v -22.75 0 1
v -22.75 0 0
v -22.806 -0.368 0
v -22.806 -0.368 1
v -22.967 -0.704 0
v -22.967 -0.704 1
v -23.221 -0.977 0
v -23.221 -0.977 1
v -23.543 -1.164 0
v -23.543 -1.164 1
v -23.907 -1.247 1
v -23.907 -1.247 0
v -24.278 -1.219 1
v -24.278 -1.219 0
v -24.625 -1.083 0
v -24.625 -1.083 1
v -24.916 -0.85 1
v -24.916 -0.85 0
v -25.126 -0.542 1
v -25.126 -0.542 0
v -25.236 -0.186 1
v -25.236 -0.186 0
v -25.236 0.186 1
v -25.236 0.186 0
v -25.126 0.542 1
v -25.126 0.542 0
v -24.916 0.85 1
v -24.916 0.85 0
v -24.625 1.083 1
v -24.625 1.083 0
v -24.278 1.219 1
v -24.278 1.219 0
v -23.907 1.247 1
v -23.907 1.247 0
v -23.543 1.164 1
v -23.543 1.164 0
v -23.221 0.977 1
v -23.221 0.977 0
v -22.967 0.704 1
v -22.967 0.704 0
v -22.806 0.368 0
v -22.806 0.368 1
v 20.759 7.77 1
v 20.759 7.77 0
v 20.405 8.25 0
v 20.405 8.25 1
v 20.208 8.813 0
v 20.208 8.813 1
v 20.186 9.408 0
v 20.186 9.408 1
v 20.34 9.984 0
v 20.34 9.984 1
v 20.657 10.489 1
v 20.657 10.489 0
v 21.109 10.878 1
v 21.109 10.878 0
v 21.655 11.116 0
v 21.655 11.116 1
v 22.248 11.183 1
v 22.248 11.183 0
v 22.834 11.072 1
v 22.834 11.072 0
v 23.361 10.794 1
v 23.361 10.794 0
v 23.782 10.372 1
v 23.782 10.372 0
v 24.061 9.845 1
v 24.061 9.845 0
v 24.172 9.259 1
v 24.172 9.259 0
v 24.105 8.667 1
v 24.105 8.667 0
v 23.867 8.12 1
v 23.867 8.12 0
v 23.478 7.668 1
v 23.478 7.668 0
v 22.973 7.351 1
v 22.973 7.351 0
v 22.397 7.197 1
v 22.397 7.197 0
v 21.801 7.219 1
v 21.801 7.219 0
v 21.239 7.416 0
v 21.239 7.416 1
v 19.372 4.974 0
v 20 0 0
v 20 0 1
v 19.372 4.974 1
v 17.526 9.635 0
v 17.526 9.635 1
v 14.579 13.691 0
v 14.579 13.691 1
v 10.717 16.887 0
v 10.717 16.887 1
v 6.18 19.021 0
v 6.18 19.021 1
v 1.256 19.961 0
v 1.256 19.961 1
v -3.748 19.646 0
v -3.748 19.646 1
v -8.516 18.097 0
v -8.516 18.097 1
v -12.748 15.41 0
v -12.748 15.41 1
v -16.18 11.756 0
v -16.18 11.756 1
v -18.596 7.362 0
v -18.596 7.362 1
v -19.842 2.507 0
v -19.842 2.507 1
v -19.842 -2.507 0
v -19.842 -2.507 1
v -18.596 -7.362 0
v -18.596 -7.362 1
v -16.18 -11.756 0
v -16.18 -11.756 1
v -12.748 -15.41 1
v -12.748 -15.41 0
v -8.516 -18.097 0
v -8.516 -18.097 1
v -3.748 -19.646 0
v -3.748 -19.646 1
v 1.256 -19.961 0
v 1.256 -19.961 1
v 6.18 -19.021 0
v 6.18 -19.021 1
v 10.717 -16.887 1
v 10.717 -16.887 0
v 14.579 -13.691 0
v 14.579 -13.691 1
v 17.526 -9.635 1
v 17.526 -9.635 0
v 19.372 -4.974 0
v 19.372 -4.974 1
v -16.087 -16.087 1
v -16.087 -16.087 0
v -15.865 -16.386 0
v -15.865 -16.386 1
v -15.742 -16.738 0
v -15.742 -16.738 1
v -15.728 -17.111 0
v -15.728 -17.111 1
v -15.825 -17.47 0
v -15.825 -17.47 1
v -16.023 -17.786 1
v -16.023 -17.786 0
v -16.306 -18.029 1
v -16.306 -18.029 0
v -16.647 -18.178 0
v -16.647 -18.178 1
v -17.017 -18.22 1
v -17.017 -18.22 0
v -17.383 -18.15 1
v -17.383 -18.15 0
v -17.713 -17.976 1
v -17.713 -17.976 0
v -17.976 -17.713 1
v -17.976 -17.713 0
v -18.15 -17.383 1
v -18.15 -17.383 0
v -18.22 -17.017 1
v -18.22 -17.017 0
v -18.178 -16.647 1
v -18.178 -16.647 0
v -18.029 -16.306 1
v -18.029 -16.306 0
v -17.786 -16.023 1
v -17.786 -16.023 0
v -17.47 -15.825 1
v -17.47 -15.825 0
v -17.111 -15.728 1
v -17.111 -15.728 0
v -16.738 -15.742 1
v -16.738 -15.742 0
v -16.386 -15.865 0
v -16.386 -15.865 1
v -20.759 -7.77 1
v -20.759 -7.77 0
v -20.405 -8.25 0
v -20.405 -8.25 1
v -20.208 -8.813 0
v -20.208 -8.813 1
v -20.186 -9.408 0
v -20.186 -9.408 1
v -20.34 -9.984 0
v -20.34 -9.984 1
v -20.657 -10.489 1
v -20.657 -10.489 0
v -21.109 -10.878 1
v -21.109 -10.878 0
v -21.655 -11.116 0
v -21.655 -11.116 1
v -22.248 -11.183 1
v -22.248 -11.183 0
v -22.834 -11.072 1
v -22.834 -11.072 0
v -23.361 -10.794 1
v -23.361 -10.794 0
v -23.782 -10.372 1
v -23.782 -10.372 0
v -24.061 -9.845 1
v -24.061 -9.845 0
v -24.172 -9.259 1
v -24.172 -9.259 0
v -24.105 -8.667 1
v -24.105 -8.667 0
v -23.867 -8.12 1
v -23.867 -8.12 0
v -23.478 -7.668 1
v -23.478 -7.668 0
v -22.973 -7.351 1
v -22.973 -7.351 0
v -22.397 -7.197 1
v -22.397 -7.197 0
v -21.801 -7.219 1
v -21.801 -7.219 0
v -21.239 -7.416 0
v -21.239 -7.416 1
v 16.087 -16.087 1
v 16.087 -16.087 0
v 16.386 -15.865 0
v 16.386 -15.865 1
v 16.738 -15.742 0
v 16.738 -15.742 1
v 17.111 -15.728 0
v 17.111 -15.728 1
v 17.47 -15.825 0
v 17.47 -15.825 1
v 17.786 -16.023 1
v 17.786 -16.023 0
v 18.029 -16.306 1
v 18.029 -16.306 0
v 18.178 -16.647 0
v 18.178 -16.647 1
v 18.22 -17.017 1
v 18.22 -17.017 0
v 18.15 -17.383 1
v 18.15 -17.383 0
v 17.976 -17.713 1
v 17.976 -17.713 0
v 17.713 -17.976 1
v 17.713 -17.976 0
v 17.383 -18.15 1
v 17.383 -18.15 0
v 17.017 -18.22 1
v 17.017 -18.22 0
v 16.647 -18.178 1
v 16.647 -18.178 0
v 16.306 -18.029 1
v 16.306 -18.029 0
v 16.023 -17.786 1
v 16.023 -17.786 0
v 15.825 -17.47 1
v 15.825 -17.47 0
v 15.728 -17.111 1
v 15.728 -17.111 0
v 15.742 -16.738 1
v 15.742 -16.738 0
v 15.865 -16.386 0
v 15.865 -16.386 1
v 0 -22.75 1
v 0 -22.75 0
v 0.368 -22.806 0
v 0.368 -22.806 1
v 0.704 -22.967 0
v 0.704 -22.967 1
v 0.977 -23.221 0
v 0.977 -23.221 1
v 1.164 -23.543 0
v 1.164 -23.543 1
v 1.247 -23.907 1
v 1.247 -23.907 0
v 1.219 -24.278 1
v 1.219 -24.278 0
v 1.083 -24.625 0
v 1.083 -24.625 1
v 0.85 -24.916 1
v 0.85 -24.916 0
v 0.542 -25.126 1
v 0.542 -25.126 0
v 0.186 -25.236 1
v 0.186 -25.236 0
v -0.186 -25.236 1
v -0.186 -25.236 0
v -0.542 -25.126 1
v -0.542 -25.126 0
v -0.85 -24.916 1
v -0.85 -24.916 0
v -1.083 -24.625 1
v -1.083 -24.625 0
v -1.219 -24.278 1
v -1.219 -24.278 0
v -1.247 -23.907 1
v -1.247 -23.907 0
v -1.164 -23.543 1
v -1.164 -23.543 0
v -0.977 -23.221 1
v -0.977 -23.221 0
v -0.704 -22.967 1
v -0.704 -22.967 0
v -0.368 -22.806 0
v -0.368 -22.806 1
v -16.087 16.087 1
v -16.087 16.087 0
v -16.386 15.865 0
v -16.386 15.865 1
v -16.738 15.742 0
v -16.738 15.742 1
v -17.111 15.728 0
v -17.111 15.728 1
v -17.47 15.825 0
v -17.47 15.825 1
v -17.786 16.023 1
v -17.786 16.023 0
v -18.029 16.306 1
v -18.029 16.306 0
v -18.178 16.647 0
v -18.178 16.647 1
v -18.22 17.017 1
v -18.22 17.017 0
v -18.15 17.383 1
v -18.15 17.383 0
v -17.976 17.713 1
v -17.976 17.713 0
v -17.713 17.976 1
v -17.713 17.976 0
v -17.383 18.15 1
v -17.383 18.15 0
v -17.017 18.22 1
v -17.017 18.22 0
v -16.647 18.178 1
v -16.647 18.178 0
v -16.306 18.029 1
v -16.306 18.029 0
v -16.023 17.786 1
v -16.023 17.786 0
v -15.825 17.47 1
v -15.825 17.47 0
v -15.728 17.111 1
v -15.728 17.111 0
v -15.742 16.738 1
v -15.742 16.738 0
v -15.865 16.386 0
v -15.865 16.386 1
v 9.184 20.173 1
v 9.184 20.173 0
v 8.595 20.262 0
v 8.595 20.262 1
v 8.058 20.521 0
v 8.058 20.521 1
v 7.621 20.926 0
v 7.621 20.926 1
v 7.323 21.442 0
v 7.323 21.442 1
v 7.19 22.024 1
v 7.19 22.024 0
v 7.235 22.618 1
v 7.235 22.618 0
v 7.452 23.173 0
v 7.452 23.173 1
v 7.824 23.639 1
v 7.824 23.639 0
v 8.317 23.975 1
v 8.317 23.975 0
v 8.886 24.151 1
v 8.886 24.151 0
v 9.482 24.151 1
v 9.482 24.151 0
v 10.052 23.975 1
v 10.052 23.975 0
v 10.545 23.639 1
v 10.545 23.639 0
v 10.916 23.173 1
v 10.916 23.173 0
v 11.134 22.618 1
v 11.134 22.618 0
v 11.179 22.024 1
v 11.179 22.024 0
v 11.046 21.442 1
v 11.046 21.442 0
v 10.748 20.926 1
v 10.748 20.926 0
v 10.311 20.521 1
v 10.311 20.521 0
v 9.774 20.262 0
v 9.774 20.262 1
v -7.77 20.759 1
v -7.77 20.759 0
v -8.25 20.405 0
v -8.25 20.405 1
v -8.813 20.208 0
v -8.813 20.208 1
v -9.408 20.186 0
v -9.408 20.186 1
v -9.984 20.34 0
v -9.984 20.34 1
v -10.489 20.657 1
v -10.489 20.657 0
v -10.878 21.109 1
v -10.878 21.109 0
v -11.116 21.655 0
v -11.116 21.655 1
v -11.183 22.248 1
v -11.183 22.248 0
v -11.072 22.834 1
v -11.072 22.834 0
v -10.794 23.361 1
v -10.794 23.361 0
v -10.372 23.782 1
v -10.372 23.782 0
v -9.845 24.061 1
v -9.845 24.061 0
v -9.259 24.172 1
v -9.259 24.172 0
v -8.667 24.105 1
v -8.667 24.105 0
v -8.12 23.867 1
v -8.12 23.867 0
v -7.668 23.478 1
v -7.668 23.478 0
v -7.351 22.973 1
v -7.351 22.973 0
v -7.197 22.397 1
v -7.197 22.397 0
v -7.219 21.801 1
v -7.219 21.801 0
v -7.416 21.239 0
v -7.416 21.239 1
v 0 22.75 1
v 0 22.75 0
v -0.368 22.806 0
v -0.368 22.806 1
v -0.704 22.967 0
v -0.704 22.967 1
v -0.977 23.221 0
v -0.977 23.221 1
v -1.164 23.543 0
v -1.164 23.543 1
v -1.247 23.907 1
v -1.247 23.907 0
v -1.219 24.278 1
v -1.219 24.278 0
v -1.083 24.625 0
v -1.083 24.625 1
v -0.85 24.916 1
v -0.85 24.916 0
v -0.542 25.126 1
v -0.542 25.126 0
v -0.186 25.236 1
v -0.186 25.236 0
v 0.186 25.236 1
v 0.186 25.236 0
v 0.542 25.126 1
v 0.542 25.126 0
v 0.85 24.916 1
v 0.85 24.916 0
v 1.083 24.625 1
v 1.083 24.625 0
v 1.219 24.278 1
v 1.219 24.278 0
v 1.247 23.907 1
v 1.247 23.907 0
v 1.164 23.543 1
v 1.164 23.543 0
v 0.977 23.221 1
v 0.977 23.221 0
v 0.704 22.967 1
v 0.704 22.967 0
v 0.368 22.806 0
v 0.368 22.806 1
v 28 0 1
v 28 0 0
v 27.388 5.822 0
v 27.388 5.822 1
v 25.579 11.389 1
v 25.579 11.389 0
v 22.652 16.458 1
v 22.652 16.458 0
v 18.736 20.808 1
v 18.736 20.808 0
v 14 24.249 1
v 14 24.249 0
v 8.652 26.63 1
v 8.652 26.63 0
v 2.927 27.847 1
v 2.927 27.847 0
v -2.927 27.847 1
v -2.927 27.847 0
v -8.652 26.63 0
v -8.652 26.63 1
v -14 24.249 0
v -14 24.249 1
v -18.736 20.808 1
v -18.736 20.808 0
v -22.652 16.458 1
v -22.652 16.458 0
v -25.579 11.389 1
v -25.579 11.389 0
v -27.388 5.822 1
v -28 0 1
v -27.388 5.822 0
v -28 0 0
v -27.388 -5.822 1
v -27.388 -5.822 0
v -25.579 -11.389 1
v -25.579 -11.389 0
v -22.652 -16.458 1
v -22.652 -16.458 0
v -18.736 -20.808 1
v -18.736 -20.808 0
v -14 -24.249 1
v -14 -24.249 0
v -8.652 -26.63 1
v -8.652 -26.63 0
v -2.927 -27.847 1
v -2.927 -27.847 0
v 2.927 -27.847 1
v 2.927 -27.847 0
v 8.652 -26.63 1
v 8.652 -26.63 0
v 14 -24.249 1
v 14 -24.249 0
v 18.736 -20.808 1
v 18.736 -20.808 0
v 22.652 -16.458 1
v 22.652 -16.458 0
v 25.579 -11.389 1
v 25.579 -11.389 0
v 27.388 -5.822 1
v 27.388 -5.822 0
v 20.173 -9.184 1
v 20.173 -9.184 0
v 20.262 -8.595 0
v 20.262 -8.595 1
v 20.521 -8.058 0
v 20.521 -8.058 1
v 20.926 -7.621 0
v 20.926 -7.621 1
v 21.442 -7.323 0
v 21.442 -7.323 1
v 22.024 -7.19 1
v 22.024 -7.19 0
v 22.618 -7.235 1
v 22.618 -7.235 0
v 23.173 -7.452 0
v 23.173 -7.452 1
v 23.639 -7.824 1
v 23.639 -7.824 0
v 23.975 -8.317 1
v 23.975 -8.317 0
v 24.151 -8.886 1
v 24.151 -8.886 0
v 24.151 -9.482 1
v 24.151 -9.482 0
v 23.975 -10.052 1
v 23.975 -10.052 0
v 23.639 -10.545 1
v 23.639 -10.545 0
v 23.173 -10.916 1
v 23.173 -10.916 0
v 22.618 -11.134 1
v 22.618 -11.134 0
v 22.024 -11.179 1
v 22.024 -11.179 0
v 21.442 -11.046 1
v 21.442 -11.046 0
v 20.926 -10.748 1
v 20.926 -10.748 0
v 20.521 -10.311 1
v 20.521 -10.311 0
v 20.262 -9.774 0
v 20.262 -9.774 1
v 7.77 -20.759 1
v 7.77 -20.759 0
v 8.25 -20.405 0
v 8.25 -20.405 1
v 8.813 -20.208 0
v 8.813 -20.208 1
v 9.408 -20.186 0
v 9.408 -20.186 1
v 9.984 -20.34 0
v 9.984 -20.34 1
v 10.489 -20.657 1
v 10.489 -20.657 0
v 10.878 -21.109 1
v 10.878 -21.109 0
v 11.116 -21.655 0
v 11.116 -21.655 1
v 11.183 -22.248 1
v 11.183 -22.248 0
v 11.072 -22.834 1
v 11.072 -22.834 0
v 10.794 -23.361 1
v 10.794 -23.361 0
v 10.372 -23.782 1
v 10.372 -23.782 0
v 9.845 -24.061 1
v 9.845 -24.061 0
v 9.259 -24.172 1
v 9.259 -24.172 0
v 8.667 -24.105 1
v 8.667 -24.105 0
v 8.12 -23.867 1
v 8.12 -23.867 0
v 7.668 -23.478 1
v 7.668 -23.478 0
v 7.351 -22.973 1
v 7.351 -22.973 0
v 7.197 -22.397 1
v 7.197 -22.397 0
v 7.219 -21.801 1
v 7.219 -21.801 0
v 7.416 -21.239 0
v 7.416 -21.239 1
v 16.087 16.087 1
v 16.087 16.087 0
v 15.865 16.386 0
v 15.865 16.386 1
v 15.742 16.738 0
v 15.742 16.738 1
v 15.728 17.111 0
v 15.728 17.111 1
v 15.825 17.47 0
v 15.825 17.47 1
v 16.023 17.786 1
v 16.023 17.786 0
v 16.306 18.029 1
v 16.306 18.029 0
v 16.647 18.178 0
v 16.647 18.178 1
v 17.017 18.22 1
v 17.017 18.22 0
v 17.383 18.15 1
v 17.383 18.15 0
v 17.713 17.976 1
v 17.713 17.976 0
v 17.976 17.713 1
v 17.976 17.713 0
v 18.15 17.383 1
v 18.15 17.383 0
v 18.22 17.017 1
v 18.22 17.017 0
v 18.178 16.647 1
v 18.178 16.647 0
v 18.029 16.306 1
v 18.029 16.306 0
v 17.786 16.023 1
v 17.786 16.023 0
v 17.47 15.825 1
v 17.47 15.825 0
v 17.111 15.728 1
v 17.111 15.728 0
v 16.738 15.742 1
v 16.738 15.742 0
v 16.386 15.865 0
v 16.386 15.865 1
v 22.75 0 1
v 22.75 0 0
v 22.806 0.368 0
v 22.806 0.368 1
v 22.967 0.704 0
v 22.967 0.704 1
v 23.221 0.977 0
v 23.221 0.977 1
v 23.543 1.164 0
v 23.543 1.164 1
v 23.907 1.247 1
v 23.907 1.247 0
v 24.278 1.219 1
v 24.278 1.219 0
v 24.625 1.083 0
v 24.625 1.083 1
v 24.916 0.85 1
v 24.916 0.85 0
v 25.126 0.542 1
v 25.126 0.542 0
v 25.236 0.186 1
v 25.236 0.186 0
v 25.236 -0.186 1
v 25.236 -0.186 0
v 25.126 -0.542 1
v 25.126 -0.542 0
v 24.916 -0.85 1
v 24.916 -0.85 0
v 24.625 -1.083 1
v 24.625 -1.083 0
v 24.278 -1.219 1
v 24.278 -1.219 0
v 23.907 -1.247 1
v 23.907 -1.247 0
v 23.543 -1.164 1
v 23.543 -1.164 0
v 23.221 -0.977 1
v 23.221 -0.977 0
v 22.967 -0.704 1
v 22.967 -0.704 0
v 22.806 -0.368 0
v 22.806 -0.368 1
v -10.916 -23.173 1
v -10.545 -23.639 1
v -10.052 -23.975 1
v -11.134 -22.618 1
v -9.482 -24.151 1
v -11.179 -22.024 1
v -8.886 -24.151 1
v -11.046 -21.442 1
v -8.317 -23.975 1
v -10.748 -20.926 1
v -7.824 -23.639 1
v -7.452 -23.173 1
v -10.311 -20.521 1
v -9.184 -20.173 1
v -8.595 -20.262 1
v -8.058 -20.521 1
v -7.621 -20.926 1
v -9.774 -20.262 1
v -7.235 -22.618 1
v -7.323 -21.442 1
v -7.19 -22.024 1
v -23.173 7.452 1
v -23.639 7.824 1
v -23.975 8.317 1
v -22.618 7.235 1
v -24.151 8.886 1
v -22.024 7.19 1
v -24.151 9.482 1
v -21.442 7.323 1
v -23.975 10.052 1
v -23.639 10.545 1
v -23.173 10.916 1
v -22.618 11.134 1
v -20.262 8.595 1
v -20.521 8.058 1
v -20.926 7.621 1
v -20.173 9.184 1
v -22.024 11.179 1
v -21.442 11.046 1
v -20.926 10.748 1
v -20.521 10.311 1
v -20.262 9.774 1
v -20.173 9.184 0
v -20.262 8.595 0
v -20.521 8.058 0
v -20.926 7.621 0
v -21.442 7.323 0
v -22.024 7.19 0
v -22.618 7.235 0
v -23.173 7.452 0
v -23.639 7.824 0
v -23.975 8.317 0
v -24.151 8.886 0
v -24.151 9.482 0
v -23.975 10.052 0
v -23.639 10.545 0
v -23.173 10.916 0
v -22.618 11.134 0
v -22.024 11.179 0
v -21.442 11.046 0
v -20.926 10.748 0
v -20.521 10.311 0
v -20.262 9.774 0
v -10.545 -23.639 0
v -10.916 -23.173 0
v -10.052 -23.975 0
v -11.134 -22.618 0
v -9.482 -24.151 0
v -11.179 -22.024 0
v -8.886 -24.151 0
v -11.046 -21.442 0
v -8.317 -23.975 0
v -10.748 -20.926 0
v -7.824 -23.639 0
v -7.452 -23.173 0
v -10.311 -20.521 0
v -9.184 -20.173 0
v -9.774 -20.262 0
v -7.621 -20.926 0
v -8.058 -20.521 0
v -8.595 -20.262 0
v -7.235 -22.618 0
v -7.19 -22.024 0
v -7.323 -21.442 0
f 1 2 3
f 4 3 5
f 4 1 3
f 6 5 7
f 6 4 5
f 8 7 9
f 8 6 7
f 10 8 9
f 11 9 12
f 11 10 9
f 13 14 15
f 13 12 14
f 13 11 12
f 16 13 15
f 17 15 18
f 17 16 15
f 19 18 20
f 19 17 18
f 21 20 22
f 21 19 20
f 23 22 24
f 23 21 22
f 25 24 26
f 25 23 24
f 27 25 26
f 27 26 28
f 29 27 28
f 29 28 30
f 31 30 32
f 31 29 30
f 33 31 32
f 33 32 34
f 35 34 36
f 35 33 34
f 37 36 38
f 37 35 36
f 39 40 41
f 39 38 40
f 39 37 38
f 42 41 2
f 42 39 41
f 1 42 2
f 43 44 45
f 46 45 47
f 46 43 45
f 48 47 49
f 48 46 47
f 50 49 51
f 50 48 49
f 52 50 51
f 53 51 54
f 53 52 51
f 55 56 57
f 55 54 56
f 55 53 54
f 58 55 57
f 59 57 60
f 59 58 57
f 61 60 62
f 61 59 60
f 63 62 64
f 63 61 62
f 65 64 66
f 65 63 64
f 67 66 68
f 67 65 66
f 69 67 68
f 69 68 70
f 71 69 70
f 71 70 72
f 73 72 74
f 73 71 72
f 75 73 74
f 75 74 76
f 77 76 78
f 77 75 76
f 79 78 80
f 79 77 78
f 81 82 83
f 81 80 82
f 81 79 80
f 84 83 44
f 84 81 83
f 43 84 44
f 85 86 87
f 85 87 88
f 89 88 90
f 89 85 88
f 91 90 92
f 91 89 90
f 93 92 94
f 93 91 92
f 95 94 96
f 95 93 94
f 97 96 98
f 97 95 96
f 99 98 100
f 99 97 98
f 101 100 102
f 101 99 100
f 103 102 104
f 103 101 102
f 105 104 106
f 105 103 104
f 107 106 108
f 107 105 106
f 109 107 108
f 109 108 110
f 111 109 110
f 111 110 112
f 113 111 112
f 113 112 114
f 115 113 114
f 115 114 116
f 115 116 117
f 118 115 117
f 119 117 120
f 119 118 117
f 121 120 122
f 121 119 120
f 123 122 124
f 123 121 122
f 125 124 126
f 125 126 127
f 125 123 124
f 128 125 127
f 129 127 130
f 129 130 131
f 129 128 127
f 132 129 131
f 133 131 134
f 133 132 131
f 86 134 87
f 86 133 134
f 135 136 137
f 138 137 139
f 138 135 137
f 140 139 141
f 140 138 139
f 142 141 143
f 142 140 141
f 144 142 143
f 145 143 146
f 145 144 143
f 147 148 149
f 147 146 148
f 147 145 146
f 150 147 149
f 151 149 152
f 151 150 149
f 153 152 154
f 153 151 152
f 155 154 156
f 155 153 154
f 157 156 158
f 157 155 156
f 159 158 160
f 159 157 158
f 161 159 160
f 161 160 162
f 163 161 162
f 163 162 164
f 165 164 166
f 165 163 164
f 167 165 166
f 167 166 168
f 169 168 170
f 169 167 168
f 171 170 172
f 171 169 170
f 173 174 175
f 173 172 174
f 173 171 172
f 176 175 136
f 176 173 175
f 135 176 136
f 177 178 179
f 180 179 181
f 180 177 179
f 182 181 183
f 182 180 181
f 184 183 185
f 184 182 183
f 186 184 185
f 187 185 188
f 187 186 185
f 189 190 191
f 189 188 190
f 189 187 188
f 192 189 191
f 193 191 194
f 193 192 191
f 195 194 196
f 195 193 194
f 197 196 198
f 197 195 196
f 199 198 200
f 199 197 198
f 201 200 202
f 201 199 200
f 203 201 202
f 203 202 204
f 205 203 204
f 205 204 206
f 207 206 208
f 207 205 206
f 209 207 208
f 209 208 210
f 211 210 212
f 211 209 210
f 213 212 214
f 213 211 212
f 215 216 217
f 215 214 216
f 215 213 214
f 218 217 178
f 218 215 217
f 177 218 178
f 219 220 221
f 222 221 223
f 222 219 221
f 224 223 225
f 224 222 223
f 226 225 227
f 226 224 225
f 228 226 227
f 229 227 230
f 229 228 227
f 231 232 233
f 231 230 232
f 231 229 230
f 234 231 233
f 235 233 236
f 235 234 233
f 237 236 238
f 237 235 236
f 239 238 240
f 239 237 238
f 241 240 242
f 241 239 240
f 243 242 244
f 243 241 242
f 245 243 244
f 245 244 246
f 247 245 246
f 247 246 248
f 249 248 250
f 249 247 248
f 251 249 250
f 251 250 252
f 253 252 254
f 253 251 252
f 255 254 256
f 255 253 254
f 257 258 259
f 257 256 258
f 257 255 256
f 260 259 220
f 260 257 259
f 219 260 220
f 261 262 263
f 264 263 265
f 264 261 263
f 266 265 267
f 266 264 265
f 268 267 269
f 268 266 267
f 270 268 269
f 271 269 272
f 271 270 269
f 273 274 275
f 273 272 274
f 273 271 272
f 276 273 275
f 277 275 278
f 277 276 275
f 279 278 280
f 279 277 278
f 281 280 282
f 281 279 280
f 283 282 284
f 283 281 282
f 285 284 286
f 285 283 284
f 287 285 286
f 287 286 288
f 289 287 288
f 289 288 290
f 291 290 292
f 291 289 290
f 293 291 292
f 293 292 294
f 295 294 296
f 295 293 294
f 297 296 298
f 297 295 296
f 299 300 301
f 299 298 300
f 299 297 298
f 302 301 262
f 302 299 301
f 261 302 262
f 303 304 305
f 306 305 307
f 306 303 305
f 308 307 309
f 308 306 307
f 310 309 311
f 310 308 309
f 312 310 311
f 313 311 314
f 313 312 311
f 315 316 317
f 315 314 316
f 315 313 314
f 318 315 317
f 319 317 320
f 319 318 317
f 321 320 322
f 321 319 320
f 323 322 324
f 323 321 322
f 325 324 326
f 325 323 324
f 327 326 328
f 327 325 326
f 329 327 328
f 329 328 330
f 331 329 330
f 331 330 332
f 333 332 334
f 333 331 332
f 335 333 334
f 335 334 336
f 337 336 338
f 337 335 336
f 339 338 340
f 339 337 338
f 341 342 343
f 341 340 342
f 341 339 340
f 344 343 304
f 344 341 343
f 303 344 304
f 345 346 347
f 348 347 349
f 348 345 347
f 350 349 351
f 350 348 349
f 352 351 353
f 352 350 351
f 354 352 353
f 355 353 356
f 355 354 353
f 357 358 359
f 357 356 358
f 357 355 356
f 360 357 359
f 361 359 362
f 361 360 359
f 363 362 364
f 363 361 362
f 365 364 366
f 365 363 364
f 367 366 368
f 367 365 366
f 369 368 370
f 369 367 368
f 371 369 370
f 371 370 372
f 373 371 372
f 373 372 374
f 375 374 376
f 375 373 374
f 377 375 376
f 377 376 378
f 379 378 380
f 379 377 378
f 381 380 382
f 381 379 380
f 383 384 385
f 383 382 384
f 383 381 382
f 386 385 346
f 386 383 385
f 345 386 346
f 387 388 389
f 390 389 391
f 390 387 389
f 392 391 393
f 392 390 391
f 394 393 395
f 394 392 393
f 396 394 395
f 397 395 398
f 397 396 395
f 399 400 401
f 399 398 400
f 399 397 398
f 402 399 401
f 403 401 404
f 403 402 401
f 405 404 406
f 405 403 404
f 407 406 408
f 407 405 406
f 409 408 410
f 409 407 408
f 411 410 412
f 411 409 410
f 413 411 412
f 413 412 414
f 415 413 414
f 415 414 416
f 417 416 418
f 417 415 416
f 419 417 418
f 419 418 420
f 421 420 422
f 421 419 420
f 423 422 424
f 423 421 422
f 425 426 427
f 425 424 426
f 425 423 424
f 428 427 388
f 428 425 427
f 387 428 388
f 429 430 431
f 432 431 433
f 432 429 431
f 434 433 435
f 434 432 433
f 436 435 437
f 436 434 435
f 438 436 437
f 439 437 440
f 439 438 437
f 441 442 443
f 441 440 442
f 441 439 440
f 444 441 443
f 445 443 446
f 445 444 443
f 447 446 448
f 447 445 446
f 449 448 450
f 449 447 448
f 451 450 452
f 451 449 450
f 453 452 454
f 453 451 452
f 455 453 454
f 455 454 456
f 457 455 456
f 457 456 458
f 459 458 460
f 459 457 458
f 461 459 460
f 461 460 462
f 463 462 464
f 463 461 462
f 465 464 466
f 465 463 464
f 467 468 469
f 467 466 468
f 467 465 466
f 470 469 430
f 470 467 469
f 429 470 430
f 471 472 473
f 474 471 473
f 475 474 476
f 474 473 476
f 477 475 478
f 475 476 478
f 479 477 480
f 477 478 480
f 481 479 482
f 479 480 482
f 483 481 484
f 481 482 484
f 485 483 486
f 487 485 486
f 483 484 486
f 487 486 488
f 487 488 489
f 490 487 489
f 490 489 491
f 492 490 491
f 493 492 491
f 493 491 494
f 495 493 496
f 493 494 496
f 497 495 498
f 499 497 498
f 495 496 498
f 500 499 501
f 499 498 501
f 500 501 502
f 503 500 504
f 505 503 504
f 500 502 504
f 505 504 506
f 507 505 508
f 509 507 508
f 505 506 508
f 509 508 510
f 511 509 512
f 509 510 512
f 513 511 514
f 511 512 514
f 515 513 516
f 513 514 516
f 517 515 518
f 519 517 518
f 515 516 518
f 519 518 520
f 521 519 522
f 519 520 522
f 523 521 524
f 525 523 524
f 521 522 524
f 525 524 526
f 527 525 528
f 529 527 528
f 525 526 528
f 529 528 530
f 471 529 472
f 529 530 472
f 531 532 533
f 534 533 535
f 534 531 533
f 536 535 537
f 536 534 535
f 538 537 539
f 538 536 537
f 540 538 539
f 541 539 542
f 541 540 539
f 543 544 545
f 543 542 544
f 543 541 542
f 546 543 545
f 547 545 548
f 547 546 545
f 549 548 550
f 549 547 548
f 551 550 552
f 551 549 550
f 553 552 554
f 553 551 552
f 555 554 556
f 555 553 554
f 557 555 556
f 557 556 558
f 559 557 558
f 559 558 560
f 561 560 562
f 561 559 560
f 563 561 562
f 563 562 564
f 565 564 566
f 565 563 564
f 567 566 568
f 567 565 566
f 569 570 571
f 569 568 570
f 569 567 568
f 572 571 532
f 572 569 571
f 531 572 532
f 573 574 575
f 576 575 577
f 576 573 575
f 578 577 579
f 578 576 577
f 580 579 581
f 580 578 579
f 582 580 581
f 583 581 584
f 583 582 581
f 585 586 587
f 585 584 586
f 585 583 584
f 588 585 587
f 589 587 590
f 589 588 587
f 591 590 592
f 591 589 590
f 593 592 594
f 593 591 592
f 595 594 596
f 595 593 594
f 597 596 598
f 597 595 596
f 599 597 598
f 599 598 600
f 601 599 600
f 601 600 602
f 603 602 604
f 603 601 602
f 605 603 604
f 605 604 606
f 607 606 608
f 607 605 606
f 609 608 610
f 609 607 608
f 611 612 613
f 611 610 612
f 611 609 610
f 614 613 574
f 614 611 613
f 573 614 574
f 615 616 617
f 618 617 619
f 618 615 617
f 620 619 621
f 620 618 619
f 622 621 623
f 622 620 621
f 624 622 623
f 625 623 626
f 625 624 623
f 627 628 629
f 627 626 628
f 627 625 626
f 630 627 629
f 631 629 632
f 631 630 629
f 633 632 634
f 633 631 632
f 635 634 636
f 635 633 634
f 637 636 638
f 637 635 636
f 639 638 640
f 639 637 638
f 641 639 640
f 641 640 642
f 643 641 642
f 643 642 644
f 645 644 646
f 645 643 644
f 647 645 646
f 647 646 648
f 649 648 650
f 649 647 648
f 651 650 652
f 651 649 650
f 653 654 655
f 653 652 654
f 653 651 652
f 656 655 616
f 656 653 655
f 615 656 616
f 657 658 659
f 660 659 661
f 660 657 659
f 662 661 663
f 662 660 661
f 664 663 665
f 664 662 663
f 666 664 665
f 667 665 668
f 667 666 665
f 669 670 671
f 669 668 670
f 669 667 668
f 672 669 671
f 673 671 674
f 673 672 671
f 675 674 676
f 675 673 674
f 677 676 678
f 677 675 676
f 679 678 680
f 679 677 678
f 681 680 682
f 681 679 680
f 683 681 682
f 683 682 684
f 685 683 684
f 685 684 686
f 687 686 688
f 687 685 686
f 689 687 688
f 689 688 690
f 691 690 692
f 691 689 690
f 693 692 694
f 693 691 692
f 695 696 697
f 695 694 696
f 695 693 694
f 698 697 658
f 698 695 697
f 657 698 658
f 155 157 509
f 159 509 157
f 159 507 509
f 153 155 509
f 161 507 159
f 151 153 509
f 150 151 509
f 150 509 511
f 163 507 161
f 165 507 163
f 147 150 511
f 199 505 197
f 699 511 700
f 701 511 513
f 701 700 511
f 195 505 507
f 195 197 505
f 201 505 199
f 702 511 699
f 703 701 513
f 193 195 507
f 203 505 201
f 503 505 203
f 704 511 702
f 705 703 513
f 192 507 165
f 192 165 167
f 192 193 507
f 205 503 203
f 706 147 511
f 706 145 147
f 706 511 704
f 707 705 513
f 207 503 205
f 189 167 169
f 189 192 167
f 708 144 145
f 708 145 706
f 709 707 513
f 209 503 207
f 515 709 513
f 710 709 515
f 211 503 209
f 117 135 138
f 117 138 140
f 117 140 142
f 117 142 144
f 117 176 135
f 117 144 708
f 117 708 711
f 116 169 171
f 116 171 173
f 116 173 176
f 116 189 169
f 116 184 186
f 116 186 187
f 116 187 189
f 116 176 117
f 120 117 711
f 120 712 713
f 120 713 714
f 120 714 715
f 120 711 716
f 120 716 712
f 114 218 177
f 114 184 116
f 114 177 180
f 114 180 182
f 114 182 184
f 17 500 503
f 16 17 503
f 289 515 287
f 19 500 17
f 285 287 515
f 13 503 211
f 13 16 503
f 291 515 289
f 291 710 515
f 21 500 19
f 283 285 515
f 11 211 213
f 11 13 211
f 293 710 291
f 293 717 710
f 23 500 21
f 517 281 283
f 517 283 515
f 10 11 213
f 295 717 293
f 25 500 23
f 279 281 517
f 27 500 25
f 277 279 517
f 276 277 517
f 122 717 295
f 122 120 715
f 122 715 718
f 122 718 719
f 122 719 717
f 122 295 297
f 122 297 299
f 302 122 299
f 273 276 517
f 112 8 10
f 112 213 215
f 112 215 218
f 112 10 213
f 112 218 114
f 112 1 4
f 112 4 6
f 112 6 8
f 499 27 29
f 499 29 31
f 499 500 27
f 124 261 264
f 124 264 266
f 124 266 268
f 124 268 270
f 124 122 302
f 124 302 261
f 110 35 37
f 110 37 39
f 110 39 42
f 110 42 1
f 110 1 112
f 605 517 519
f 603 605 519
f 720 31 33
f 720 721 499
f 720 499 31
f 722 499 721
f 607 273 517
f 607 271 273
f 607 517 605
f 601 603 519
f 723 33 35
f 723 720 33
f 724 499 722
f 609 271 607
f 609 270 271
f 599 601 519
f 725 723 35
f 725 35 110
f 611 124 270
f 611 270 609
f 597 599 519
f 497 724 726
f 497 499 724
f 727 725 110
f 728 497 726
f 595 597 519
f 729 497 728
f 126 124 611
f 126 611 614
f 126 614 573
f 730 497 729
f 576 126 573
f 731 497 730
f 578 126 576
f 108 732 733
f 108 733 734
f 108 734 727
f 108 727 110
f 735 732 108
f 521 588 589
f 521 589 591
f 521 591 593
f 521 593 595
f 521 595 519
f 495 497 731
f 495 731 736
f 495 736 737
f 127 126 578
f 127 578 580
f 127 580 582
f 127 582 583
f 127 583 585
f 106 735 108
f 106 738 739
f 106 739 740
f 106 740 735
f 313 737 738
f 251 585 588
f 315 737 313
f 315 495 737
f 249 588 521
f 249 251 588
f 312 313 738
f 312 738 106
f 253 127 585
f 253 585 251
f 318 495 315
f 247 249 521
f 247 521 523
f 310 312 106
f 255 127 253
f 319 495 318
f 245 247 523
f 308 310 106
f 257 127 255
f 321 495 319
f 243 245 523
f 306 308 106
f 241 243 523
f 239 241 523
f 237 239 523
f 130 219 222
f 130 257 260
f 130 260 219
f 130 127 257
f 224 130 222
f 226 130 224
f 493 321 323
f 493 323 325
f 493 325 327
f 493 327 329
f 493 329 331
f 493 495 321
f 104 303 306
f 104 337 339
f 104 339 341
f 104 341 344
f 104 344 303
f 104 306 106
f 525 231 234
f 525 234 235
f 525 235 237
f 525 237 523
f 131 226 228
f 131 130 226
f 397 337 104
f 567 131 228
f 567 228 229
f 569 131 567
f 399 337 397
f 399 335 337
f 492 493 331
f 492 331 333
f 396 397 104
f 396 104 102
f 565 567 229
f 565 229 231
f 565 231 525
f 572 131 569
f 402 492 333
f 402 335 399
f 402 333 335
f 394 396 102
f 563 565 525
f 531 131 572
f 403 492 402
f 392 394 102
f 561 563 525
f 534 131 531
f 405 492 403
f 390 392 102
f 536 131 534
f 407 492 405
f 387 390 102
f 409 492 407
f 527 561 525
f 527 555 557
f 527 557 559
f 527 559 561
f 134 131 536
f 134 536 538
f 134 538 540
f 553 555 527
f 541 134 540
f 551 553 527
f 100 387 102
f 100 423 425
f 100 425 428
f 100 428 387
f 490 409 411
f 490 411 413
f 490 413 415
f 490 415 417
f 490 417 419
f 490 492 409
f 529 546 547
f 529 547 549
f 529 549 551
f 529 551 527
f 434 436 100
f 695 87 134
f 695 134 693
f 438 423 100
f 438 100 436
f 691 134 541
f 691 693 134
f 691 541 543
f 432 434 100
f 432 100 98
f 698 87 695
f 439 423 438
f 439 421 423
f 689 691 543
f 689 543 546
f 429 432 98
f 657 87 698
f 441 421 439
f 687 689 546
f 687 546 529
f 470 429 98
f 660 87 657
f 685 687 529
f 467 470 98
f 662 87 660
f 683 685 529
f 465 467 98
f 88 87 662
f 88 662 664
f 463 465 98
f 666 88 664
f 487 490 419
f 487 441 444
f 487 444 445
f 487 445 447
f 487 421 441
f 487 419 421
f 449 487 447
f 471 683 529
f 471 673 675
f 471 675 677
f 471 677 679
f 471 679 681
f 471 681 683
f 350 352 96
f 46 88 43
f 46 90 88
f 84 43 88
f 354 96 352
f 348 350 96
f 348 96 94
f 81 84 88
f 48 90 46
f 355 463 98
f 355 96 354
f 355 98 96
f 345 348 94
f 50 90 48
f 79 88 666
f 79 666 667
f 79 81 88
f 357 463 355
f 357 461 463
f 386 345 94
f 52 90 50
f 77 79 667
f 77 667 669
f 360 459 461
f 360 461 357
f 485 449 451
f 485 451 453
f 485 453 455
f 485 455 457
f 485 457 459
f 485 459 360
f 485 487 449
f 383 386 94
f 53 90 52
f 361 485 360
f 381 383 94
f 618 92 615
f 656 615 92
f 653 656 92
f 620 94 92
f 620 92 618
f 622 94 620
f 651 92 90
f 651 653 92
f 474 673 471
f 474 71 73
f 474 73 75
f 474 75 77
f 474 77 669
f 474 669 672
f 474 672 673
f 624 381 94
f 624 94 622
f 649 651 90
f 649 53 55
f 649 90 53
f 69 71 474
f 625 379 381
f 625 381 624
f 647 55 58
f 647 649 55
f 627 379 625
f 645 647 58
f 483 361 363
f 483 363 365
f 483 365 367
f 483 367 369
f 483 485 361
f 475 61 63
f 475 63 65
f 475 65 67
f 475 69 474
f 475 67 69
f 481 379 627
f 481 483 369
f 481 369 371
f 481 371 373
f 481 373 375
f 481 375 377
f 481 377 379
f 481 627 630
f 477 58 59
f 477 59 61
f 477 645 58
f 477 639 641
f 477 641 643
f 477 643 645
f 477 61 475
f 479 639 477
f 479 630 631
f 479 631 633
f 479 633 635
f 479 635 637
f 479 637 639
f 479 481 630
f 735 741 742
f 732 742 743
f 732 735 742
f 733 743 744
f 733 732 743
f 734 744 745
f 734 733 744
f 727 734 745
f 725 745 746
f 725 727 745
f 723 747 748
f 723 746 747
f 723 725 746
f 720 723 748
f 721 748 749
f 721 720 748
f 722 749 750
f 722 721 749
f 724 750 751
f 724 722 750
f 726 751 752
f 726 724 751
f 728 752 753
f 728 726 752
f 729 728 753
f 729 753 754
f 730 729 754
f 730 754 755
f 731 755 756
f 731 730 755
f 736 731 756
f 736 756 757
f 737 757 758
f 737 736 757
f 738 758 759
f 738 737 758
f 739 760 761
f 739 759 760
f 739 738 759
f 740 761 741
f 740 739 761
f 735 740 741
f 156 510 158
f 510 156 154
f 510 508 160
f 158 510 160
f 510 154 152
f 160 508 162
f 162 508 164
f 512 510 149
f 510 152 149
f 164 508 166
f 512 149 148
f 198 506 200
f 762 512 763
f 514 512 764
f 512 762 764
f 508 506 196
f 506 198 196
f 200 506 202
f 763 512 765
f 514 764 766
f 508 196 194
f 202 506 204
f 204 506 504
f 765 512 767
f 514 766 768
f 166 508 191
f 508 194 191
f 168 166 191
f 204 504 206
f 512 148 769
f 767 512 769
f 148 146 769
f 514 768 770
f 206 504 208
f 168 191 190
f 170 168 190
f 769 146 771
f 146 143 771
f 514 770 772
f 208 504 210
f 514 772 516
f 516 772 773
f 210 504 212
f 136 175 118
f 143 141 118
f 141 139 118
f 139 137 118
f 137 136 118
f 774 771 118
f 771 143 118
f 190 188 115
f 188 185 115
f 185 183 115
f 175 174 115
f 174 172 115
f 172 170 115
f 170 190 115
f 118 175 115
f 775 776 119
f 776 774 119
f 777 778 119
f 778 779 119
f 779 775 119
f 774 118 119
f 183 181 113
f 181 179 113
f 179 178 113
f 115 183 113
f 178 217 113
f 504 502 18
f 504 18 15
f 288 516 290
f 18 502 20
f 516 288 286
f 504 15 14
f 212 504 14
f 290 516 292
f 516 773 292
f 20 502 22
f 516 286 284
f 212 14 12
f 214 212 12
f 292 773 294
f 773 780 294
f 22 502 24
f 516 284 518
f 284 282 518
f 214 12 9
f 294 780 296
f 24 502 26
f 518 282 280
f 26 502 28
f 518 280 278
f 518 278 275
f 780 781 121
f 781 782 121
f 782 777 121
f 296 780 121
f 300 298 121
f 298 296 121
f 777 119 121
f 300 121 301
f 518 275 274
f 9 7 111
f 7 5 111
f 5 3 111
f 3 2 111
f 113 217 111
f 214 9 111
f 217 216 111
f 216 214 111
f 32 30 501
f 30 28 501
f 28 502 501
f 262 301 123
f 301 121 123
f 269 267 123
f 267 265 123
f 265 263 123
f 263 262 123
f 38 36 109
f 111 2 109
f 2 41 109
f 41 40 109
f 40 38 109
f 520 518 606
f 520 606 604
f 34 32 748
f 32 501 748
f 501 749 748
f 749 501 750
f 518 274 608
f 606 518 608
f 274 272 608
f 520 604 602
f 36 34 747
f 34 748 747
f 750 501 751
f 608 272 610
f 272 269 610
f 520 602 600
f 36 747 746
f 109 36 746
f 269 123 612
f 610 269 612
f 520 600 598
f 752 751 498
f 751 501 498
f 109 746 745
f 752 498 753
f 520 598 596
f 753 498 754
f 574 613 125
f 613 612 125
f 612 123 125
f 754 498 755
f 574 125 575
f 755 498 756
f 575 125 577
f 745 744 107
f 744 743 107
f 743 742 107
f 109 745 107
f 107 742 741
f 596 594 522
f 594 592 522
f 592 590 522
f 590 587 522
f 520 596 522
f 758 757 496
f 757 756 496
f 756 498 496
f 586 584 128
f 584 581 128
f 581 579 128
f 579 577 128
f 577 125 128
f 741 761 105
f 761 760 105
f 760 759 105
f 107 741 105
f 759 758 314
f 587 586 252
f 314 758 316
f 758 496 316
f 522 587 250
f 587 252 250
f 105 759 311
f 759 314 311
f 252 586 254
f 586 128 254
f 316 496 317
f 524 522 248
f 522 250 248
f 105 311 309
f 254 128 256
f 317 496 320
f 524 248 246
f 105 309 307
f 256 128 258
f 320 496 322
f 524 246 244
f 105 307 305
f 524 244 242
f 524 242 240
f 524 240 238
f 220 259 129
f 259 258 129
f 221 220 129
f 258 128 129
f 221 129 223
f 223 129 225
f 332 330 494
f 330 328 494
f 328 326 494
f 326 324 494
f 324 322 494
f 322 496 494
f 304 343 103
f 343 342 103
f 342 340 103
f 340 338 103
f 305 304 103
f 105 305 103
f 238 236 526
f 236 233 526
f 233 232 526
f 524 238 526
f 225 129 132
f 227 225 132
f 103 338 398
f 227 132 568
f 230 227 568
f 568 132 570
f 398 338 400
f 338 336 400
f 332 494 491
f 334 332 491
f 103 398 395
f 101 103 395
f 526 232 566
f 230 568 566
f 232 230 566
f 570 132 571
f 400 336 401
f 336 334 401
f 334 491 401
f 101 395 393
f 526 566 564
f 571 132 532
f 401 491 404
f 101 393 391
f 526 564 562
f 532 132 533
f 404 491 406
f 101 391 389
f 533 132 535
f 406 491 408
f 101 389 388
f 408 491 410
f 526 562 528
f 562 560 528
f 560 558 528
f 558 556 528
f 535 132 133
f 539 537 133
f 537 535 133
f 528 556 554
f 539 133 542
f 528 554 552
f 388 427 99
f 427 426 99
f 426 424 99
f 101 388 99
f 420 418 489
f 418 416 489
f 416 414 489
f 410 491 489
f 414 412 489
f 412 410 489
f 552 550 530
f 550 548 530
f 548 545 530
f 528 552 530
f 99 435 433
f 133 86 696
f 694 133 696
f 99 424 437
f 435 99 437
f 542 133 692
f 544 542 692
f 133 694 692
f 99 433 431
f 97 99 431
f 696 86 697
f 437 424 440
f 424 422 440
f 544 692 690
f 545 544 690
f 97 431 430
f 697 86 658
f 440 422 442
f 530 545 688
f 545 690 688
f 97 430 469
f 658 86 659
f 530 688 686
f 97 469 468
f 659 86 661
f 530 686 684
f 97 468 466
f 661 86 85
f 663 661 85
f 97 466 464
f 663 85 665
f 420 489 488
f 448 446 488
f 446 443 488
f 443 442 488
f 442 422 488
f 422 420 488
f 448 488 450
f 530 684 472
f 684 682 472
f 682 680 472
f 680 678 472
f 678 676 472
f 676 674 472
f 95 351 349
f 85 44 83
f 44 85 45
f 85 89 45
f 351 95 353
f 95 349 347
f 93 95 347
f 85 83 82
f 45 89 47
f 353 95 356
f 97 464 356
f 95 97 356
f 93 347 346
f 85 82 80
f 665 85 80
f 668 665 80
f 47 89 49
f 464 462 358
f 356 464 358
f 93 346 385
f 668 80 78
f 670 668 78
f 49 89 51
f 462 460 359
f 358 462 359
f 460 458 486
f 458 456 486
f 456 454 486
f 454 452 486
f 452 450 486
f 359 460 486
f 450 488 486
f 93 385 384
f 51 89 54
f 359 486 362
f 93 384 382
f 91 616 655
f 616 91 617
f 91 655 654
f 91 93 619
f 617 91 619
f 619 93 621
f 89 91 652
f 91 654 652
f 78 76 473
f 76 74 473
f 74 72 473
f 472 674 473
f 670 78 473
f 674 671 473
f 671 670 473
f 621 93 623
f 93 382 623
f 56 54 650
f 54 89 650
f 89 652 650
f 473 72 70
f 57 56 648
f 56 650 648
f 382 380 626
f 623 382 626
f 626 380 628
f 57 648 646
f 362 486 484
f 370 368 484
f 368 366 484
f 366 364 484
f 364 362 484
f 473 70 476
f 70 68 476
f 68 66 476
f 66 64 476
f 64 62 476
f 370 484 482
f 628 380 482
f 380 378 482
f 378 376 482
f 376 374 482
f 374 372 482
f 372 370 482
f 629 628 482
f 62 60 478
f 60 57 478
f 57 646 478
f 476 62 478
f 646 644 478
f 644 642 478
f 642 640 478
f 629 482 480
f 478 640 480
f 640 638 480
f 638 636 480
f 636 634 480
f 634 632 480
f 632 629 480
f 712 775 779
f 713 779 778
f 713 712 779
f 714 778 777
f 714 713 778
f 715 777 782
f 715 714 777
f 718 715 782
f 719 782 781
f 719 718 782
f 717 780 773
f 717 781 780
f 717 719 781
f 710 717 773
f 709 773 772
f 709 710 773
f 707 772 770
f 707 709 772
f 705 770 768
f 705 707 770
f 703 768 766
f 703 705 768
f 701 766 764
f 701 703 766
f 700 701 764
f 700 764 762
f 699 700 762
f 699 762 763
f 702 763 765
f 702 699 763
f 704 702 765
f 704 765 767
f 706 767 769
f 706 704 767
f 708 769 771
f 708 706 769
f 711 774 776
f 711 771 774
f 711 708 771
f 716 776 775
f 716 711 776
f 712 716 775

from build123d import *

# Parameters (mm, degrees)
SKETCH1_R           = 28
SKETCH1_R_2         = 20
BOSS_EXTRUDE1_DEPTH = 1
CIRPATTERN1_COUNT   = 8
CIRPATTERN2_COUNT   = 8


with BuildPart() as part:
    # Sketch1 → Boss-Extrude1 (new body)
    with BuildSketch(Plane.XY):
        Circle(SKETCH1_R)
        Circle(SKETCH1_R_2, mode=Mode.SUBTRACT)
    extrude(amount=BOSS_EXTRUDE1_DEPTH)

    # Sketch2 → Ø2.5 (2.5) Diameter Hole1 (revolve, cut)
    with BuildSketch(Plane(origin=(0, 24, 1), x_dir=(0, -1, 0), z_dir=(1, 0, 0))):
        Polygon((0, 0), (0, 2.251075774), (1.25, 1.5), (1.25, 0), align=None)
    f_2_5_2_5_diameter_hole1 = revolve(axis=Axis((0, 24, 7.35), (0, 0, -1)), mode=Mode.SUBTRACT)

    # CirPattern1: Ø2.5 (2.5) Diameter Hole1 ×8 about axis
    cirpattern1_axis = Axis((0, 0, -0.0127), (0, 0, -1))
    for i in range(1, CIRPATTERN1_COUNT):
        add(f_2_5_2_5_diameter_hole1.rotate(cirpattern1_axis, i * 360 / CIRPATTERN1_COUNT), mode=Mode.SUBTRACT)

    # Sketch4 → Ø4.0 (4) Diameter Hole1 (revolve, cut)
    with BuildSketch(Plane(origin=(9.184402377, 22.17310878, 1), x_dir=(0, -1, 0), z_dir=(1, 0, 0))):
        Polygon((0, 0), (0, 2.701721238), (2, 1.5), (2, 0), align=None)
    f_4_0_4_diameter_hole1 = revolve(axis=Axis((9.184402377, 22.17310878, 7.35), (0, 0, -1)), mode=Mode.SUBTRACT)

    # CirPattern2: Ø4.0 (4) Diameter Hole1 ×8 about axis
    cirpattern2_axis = Axis((0, 0, -0.0127), (0, 0, -1))
    for i in range(1, CIRPATTERN2_COUNT):
        add(f_4_0_4_diameter_hole1.rotate(cirpattern2_axis, i * 360 / CIRPATTERN2_COUNT), mode=Mode.SUBTRACT)


solid = part.part
